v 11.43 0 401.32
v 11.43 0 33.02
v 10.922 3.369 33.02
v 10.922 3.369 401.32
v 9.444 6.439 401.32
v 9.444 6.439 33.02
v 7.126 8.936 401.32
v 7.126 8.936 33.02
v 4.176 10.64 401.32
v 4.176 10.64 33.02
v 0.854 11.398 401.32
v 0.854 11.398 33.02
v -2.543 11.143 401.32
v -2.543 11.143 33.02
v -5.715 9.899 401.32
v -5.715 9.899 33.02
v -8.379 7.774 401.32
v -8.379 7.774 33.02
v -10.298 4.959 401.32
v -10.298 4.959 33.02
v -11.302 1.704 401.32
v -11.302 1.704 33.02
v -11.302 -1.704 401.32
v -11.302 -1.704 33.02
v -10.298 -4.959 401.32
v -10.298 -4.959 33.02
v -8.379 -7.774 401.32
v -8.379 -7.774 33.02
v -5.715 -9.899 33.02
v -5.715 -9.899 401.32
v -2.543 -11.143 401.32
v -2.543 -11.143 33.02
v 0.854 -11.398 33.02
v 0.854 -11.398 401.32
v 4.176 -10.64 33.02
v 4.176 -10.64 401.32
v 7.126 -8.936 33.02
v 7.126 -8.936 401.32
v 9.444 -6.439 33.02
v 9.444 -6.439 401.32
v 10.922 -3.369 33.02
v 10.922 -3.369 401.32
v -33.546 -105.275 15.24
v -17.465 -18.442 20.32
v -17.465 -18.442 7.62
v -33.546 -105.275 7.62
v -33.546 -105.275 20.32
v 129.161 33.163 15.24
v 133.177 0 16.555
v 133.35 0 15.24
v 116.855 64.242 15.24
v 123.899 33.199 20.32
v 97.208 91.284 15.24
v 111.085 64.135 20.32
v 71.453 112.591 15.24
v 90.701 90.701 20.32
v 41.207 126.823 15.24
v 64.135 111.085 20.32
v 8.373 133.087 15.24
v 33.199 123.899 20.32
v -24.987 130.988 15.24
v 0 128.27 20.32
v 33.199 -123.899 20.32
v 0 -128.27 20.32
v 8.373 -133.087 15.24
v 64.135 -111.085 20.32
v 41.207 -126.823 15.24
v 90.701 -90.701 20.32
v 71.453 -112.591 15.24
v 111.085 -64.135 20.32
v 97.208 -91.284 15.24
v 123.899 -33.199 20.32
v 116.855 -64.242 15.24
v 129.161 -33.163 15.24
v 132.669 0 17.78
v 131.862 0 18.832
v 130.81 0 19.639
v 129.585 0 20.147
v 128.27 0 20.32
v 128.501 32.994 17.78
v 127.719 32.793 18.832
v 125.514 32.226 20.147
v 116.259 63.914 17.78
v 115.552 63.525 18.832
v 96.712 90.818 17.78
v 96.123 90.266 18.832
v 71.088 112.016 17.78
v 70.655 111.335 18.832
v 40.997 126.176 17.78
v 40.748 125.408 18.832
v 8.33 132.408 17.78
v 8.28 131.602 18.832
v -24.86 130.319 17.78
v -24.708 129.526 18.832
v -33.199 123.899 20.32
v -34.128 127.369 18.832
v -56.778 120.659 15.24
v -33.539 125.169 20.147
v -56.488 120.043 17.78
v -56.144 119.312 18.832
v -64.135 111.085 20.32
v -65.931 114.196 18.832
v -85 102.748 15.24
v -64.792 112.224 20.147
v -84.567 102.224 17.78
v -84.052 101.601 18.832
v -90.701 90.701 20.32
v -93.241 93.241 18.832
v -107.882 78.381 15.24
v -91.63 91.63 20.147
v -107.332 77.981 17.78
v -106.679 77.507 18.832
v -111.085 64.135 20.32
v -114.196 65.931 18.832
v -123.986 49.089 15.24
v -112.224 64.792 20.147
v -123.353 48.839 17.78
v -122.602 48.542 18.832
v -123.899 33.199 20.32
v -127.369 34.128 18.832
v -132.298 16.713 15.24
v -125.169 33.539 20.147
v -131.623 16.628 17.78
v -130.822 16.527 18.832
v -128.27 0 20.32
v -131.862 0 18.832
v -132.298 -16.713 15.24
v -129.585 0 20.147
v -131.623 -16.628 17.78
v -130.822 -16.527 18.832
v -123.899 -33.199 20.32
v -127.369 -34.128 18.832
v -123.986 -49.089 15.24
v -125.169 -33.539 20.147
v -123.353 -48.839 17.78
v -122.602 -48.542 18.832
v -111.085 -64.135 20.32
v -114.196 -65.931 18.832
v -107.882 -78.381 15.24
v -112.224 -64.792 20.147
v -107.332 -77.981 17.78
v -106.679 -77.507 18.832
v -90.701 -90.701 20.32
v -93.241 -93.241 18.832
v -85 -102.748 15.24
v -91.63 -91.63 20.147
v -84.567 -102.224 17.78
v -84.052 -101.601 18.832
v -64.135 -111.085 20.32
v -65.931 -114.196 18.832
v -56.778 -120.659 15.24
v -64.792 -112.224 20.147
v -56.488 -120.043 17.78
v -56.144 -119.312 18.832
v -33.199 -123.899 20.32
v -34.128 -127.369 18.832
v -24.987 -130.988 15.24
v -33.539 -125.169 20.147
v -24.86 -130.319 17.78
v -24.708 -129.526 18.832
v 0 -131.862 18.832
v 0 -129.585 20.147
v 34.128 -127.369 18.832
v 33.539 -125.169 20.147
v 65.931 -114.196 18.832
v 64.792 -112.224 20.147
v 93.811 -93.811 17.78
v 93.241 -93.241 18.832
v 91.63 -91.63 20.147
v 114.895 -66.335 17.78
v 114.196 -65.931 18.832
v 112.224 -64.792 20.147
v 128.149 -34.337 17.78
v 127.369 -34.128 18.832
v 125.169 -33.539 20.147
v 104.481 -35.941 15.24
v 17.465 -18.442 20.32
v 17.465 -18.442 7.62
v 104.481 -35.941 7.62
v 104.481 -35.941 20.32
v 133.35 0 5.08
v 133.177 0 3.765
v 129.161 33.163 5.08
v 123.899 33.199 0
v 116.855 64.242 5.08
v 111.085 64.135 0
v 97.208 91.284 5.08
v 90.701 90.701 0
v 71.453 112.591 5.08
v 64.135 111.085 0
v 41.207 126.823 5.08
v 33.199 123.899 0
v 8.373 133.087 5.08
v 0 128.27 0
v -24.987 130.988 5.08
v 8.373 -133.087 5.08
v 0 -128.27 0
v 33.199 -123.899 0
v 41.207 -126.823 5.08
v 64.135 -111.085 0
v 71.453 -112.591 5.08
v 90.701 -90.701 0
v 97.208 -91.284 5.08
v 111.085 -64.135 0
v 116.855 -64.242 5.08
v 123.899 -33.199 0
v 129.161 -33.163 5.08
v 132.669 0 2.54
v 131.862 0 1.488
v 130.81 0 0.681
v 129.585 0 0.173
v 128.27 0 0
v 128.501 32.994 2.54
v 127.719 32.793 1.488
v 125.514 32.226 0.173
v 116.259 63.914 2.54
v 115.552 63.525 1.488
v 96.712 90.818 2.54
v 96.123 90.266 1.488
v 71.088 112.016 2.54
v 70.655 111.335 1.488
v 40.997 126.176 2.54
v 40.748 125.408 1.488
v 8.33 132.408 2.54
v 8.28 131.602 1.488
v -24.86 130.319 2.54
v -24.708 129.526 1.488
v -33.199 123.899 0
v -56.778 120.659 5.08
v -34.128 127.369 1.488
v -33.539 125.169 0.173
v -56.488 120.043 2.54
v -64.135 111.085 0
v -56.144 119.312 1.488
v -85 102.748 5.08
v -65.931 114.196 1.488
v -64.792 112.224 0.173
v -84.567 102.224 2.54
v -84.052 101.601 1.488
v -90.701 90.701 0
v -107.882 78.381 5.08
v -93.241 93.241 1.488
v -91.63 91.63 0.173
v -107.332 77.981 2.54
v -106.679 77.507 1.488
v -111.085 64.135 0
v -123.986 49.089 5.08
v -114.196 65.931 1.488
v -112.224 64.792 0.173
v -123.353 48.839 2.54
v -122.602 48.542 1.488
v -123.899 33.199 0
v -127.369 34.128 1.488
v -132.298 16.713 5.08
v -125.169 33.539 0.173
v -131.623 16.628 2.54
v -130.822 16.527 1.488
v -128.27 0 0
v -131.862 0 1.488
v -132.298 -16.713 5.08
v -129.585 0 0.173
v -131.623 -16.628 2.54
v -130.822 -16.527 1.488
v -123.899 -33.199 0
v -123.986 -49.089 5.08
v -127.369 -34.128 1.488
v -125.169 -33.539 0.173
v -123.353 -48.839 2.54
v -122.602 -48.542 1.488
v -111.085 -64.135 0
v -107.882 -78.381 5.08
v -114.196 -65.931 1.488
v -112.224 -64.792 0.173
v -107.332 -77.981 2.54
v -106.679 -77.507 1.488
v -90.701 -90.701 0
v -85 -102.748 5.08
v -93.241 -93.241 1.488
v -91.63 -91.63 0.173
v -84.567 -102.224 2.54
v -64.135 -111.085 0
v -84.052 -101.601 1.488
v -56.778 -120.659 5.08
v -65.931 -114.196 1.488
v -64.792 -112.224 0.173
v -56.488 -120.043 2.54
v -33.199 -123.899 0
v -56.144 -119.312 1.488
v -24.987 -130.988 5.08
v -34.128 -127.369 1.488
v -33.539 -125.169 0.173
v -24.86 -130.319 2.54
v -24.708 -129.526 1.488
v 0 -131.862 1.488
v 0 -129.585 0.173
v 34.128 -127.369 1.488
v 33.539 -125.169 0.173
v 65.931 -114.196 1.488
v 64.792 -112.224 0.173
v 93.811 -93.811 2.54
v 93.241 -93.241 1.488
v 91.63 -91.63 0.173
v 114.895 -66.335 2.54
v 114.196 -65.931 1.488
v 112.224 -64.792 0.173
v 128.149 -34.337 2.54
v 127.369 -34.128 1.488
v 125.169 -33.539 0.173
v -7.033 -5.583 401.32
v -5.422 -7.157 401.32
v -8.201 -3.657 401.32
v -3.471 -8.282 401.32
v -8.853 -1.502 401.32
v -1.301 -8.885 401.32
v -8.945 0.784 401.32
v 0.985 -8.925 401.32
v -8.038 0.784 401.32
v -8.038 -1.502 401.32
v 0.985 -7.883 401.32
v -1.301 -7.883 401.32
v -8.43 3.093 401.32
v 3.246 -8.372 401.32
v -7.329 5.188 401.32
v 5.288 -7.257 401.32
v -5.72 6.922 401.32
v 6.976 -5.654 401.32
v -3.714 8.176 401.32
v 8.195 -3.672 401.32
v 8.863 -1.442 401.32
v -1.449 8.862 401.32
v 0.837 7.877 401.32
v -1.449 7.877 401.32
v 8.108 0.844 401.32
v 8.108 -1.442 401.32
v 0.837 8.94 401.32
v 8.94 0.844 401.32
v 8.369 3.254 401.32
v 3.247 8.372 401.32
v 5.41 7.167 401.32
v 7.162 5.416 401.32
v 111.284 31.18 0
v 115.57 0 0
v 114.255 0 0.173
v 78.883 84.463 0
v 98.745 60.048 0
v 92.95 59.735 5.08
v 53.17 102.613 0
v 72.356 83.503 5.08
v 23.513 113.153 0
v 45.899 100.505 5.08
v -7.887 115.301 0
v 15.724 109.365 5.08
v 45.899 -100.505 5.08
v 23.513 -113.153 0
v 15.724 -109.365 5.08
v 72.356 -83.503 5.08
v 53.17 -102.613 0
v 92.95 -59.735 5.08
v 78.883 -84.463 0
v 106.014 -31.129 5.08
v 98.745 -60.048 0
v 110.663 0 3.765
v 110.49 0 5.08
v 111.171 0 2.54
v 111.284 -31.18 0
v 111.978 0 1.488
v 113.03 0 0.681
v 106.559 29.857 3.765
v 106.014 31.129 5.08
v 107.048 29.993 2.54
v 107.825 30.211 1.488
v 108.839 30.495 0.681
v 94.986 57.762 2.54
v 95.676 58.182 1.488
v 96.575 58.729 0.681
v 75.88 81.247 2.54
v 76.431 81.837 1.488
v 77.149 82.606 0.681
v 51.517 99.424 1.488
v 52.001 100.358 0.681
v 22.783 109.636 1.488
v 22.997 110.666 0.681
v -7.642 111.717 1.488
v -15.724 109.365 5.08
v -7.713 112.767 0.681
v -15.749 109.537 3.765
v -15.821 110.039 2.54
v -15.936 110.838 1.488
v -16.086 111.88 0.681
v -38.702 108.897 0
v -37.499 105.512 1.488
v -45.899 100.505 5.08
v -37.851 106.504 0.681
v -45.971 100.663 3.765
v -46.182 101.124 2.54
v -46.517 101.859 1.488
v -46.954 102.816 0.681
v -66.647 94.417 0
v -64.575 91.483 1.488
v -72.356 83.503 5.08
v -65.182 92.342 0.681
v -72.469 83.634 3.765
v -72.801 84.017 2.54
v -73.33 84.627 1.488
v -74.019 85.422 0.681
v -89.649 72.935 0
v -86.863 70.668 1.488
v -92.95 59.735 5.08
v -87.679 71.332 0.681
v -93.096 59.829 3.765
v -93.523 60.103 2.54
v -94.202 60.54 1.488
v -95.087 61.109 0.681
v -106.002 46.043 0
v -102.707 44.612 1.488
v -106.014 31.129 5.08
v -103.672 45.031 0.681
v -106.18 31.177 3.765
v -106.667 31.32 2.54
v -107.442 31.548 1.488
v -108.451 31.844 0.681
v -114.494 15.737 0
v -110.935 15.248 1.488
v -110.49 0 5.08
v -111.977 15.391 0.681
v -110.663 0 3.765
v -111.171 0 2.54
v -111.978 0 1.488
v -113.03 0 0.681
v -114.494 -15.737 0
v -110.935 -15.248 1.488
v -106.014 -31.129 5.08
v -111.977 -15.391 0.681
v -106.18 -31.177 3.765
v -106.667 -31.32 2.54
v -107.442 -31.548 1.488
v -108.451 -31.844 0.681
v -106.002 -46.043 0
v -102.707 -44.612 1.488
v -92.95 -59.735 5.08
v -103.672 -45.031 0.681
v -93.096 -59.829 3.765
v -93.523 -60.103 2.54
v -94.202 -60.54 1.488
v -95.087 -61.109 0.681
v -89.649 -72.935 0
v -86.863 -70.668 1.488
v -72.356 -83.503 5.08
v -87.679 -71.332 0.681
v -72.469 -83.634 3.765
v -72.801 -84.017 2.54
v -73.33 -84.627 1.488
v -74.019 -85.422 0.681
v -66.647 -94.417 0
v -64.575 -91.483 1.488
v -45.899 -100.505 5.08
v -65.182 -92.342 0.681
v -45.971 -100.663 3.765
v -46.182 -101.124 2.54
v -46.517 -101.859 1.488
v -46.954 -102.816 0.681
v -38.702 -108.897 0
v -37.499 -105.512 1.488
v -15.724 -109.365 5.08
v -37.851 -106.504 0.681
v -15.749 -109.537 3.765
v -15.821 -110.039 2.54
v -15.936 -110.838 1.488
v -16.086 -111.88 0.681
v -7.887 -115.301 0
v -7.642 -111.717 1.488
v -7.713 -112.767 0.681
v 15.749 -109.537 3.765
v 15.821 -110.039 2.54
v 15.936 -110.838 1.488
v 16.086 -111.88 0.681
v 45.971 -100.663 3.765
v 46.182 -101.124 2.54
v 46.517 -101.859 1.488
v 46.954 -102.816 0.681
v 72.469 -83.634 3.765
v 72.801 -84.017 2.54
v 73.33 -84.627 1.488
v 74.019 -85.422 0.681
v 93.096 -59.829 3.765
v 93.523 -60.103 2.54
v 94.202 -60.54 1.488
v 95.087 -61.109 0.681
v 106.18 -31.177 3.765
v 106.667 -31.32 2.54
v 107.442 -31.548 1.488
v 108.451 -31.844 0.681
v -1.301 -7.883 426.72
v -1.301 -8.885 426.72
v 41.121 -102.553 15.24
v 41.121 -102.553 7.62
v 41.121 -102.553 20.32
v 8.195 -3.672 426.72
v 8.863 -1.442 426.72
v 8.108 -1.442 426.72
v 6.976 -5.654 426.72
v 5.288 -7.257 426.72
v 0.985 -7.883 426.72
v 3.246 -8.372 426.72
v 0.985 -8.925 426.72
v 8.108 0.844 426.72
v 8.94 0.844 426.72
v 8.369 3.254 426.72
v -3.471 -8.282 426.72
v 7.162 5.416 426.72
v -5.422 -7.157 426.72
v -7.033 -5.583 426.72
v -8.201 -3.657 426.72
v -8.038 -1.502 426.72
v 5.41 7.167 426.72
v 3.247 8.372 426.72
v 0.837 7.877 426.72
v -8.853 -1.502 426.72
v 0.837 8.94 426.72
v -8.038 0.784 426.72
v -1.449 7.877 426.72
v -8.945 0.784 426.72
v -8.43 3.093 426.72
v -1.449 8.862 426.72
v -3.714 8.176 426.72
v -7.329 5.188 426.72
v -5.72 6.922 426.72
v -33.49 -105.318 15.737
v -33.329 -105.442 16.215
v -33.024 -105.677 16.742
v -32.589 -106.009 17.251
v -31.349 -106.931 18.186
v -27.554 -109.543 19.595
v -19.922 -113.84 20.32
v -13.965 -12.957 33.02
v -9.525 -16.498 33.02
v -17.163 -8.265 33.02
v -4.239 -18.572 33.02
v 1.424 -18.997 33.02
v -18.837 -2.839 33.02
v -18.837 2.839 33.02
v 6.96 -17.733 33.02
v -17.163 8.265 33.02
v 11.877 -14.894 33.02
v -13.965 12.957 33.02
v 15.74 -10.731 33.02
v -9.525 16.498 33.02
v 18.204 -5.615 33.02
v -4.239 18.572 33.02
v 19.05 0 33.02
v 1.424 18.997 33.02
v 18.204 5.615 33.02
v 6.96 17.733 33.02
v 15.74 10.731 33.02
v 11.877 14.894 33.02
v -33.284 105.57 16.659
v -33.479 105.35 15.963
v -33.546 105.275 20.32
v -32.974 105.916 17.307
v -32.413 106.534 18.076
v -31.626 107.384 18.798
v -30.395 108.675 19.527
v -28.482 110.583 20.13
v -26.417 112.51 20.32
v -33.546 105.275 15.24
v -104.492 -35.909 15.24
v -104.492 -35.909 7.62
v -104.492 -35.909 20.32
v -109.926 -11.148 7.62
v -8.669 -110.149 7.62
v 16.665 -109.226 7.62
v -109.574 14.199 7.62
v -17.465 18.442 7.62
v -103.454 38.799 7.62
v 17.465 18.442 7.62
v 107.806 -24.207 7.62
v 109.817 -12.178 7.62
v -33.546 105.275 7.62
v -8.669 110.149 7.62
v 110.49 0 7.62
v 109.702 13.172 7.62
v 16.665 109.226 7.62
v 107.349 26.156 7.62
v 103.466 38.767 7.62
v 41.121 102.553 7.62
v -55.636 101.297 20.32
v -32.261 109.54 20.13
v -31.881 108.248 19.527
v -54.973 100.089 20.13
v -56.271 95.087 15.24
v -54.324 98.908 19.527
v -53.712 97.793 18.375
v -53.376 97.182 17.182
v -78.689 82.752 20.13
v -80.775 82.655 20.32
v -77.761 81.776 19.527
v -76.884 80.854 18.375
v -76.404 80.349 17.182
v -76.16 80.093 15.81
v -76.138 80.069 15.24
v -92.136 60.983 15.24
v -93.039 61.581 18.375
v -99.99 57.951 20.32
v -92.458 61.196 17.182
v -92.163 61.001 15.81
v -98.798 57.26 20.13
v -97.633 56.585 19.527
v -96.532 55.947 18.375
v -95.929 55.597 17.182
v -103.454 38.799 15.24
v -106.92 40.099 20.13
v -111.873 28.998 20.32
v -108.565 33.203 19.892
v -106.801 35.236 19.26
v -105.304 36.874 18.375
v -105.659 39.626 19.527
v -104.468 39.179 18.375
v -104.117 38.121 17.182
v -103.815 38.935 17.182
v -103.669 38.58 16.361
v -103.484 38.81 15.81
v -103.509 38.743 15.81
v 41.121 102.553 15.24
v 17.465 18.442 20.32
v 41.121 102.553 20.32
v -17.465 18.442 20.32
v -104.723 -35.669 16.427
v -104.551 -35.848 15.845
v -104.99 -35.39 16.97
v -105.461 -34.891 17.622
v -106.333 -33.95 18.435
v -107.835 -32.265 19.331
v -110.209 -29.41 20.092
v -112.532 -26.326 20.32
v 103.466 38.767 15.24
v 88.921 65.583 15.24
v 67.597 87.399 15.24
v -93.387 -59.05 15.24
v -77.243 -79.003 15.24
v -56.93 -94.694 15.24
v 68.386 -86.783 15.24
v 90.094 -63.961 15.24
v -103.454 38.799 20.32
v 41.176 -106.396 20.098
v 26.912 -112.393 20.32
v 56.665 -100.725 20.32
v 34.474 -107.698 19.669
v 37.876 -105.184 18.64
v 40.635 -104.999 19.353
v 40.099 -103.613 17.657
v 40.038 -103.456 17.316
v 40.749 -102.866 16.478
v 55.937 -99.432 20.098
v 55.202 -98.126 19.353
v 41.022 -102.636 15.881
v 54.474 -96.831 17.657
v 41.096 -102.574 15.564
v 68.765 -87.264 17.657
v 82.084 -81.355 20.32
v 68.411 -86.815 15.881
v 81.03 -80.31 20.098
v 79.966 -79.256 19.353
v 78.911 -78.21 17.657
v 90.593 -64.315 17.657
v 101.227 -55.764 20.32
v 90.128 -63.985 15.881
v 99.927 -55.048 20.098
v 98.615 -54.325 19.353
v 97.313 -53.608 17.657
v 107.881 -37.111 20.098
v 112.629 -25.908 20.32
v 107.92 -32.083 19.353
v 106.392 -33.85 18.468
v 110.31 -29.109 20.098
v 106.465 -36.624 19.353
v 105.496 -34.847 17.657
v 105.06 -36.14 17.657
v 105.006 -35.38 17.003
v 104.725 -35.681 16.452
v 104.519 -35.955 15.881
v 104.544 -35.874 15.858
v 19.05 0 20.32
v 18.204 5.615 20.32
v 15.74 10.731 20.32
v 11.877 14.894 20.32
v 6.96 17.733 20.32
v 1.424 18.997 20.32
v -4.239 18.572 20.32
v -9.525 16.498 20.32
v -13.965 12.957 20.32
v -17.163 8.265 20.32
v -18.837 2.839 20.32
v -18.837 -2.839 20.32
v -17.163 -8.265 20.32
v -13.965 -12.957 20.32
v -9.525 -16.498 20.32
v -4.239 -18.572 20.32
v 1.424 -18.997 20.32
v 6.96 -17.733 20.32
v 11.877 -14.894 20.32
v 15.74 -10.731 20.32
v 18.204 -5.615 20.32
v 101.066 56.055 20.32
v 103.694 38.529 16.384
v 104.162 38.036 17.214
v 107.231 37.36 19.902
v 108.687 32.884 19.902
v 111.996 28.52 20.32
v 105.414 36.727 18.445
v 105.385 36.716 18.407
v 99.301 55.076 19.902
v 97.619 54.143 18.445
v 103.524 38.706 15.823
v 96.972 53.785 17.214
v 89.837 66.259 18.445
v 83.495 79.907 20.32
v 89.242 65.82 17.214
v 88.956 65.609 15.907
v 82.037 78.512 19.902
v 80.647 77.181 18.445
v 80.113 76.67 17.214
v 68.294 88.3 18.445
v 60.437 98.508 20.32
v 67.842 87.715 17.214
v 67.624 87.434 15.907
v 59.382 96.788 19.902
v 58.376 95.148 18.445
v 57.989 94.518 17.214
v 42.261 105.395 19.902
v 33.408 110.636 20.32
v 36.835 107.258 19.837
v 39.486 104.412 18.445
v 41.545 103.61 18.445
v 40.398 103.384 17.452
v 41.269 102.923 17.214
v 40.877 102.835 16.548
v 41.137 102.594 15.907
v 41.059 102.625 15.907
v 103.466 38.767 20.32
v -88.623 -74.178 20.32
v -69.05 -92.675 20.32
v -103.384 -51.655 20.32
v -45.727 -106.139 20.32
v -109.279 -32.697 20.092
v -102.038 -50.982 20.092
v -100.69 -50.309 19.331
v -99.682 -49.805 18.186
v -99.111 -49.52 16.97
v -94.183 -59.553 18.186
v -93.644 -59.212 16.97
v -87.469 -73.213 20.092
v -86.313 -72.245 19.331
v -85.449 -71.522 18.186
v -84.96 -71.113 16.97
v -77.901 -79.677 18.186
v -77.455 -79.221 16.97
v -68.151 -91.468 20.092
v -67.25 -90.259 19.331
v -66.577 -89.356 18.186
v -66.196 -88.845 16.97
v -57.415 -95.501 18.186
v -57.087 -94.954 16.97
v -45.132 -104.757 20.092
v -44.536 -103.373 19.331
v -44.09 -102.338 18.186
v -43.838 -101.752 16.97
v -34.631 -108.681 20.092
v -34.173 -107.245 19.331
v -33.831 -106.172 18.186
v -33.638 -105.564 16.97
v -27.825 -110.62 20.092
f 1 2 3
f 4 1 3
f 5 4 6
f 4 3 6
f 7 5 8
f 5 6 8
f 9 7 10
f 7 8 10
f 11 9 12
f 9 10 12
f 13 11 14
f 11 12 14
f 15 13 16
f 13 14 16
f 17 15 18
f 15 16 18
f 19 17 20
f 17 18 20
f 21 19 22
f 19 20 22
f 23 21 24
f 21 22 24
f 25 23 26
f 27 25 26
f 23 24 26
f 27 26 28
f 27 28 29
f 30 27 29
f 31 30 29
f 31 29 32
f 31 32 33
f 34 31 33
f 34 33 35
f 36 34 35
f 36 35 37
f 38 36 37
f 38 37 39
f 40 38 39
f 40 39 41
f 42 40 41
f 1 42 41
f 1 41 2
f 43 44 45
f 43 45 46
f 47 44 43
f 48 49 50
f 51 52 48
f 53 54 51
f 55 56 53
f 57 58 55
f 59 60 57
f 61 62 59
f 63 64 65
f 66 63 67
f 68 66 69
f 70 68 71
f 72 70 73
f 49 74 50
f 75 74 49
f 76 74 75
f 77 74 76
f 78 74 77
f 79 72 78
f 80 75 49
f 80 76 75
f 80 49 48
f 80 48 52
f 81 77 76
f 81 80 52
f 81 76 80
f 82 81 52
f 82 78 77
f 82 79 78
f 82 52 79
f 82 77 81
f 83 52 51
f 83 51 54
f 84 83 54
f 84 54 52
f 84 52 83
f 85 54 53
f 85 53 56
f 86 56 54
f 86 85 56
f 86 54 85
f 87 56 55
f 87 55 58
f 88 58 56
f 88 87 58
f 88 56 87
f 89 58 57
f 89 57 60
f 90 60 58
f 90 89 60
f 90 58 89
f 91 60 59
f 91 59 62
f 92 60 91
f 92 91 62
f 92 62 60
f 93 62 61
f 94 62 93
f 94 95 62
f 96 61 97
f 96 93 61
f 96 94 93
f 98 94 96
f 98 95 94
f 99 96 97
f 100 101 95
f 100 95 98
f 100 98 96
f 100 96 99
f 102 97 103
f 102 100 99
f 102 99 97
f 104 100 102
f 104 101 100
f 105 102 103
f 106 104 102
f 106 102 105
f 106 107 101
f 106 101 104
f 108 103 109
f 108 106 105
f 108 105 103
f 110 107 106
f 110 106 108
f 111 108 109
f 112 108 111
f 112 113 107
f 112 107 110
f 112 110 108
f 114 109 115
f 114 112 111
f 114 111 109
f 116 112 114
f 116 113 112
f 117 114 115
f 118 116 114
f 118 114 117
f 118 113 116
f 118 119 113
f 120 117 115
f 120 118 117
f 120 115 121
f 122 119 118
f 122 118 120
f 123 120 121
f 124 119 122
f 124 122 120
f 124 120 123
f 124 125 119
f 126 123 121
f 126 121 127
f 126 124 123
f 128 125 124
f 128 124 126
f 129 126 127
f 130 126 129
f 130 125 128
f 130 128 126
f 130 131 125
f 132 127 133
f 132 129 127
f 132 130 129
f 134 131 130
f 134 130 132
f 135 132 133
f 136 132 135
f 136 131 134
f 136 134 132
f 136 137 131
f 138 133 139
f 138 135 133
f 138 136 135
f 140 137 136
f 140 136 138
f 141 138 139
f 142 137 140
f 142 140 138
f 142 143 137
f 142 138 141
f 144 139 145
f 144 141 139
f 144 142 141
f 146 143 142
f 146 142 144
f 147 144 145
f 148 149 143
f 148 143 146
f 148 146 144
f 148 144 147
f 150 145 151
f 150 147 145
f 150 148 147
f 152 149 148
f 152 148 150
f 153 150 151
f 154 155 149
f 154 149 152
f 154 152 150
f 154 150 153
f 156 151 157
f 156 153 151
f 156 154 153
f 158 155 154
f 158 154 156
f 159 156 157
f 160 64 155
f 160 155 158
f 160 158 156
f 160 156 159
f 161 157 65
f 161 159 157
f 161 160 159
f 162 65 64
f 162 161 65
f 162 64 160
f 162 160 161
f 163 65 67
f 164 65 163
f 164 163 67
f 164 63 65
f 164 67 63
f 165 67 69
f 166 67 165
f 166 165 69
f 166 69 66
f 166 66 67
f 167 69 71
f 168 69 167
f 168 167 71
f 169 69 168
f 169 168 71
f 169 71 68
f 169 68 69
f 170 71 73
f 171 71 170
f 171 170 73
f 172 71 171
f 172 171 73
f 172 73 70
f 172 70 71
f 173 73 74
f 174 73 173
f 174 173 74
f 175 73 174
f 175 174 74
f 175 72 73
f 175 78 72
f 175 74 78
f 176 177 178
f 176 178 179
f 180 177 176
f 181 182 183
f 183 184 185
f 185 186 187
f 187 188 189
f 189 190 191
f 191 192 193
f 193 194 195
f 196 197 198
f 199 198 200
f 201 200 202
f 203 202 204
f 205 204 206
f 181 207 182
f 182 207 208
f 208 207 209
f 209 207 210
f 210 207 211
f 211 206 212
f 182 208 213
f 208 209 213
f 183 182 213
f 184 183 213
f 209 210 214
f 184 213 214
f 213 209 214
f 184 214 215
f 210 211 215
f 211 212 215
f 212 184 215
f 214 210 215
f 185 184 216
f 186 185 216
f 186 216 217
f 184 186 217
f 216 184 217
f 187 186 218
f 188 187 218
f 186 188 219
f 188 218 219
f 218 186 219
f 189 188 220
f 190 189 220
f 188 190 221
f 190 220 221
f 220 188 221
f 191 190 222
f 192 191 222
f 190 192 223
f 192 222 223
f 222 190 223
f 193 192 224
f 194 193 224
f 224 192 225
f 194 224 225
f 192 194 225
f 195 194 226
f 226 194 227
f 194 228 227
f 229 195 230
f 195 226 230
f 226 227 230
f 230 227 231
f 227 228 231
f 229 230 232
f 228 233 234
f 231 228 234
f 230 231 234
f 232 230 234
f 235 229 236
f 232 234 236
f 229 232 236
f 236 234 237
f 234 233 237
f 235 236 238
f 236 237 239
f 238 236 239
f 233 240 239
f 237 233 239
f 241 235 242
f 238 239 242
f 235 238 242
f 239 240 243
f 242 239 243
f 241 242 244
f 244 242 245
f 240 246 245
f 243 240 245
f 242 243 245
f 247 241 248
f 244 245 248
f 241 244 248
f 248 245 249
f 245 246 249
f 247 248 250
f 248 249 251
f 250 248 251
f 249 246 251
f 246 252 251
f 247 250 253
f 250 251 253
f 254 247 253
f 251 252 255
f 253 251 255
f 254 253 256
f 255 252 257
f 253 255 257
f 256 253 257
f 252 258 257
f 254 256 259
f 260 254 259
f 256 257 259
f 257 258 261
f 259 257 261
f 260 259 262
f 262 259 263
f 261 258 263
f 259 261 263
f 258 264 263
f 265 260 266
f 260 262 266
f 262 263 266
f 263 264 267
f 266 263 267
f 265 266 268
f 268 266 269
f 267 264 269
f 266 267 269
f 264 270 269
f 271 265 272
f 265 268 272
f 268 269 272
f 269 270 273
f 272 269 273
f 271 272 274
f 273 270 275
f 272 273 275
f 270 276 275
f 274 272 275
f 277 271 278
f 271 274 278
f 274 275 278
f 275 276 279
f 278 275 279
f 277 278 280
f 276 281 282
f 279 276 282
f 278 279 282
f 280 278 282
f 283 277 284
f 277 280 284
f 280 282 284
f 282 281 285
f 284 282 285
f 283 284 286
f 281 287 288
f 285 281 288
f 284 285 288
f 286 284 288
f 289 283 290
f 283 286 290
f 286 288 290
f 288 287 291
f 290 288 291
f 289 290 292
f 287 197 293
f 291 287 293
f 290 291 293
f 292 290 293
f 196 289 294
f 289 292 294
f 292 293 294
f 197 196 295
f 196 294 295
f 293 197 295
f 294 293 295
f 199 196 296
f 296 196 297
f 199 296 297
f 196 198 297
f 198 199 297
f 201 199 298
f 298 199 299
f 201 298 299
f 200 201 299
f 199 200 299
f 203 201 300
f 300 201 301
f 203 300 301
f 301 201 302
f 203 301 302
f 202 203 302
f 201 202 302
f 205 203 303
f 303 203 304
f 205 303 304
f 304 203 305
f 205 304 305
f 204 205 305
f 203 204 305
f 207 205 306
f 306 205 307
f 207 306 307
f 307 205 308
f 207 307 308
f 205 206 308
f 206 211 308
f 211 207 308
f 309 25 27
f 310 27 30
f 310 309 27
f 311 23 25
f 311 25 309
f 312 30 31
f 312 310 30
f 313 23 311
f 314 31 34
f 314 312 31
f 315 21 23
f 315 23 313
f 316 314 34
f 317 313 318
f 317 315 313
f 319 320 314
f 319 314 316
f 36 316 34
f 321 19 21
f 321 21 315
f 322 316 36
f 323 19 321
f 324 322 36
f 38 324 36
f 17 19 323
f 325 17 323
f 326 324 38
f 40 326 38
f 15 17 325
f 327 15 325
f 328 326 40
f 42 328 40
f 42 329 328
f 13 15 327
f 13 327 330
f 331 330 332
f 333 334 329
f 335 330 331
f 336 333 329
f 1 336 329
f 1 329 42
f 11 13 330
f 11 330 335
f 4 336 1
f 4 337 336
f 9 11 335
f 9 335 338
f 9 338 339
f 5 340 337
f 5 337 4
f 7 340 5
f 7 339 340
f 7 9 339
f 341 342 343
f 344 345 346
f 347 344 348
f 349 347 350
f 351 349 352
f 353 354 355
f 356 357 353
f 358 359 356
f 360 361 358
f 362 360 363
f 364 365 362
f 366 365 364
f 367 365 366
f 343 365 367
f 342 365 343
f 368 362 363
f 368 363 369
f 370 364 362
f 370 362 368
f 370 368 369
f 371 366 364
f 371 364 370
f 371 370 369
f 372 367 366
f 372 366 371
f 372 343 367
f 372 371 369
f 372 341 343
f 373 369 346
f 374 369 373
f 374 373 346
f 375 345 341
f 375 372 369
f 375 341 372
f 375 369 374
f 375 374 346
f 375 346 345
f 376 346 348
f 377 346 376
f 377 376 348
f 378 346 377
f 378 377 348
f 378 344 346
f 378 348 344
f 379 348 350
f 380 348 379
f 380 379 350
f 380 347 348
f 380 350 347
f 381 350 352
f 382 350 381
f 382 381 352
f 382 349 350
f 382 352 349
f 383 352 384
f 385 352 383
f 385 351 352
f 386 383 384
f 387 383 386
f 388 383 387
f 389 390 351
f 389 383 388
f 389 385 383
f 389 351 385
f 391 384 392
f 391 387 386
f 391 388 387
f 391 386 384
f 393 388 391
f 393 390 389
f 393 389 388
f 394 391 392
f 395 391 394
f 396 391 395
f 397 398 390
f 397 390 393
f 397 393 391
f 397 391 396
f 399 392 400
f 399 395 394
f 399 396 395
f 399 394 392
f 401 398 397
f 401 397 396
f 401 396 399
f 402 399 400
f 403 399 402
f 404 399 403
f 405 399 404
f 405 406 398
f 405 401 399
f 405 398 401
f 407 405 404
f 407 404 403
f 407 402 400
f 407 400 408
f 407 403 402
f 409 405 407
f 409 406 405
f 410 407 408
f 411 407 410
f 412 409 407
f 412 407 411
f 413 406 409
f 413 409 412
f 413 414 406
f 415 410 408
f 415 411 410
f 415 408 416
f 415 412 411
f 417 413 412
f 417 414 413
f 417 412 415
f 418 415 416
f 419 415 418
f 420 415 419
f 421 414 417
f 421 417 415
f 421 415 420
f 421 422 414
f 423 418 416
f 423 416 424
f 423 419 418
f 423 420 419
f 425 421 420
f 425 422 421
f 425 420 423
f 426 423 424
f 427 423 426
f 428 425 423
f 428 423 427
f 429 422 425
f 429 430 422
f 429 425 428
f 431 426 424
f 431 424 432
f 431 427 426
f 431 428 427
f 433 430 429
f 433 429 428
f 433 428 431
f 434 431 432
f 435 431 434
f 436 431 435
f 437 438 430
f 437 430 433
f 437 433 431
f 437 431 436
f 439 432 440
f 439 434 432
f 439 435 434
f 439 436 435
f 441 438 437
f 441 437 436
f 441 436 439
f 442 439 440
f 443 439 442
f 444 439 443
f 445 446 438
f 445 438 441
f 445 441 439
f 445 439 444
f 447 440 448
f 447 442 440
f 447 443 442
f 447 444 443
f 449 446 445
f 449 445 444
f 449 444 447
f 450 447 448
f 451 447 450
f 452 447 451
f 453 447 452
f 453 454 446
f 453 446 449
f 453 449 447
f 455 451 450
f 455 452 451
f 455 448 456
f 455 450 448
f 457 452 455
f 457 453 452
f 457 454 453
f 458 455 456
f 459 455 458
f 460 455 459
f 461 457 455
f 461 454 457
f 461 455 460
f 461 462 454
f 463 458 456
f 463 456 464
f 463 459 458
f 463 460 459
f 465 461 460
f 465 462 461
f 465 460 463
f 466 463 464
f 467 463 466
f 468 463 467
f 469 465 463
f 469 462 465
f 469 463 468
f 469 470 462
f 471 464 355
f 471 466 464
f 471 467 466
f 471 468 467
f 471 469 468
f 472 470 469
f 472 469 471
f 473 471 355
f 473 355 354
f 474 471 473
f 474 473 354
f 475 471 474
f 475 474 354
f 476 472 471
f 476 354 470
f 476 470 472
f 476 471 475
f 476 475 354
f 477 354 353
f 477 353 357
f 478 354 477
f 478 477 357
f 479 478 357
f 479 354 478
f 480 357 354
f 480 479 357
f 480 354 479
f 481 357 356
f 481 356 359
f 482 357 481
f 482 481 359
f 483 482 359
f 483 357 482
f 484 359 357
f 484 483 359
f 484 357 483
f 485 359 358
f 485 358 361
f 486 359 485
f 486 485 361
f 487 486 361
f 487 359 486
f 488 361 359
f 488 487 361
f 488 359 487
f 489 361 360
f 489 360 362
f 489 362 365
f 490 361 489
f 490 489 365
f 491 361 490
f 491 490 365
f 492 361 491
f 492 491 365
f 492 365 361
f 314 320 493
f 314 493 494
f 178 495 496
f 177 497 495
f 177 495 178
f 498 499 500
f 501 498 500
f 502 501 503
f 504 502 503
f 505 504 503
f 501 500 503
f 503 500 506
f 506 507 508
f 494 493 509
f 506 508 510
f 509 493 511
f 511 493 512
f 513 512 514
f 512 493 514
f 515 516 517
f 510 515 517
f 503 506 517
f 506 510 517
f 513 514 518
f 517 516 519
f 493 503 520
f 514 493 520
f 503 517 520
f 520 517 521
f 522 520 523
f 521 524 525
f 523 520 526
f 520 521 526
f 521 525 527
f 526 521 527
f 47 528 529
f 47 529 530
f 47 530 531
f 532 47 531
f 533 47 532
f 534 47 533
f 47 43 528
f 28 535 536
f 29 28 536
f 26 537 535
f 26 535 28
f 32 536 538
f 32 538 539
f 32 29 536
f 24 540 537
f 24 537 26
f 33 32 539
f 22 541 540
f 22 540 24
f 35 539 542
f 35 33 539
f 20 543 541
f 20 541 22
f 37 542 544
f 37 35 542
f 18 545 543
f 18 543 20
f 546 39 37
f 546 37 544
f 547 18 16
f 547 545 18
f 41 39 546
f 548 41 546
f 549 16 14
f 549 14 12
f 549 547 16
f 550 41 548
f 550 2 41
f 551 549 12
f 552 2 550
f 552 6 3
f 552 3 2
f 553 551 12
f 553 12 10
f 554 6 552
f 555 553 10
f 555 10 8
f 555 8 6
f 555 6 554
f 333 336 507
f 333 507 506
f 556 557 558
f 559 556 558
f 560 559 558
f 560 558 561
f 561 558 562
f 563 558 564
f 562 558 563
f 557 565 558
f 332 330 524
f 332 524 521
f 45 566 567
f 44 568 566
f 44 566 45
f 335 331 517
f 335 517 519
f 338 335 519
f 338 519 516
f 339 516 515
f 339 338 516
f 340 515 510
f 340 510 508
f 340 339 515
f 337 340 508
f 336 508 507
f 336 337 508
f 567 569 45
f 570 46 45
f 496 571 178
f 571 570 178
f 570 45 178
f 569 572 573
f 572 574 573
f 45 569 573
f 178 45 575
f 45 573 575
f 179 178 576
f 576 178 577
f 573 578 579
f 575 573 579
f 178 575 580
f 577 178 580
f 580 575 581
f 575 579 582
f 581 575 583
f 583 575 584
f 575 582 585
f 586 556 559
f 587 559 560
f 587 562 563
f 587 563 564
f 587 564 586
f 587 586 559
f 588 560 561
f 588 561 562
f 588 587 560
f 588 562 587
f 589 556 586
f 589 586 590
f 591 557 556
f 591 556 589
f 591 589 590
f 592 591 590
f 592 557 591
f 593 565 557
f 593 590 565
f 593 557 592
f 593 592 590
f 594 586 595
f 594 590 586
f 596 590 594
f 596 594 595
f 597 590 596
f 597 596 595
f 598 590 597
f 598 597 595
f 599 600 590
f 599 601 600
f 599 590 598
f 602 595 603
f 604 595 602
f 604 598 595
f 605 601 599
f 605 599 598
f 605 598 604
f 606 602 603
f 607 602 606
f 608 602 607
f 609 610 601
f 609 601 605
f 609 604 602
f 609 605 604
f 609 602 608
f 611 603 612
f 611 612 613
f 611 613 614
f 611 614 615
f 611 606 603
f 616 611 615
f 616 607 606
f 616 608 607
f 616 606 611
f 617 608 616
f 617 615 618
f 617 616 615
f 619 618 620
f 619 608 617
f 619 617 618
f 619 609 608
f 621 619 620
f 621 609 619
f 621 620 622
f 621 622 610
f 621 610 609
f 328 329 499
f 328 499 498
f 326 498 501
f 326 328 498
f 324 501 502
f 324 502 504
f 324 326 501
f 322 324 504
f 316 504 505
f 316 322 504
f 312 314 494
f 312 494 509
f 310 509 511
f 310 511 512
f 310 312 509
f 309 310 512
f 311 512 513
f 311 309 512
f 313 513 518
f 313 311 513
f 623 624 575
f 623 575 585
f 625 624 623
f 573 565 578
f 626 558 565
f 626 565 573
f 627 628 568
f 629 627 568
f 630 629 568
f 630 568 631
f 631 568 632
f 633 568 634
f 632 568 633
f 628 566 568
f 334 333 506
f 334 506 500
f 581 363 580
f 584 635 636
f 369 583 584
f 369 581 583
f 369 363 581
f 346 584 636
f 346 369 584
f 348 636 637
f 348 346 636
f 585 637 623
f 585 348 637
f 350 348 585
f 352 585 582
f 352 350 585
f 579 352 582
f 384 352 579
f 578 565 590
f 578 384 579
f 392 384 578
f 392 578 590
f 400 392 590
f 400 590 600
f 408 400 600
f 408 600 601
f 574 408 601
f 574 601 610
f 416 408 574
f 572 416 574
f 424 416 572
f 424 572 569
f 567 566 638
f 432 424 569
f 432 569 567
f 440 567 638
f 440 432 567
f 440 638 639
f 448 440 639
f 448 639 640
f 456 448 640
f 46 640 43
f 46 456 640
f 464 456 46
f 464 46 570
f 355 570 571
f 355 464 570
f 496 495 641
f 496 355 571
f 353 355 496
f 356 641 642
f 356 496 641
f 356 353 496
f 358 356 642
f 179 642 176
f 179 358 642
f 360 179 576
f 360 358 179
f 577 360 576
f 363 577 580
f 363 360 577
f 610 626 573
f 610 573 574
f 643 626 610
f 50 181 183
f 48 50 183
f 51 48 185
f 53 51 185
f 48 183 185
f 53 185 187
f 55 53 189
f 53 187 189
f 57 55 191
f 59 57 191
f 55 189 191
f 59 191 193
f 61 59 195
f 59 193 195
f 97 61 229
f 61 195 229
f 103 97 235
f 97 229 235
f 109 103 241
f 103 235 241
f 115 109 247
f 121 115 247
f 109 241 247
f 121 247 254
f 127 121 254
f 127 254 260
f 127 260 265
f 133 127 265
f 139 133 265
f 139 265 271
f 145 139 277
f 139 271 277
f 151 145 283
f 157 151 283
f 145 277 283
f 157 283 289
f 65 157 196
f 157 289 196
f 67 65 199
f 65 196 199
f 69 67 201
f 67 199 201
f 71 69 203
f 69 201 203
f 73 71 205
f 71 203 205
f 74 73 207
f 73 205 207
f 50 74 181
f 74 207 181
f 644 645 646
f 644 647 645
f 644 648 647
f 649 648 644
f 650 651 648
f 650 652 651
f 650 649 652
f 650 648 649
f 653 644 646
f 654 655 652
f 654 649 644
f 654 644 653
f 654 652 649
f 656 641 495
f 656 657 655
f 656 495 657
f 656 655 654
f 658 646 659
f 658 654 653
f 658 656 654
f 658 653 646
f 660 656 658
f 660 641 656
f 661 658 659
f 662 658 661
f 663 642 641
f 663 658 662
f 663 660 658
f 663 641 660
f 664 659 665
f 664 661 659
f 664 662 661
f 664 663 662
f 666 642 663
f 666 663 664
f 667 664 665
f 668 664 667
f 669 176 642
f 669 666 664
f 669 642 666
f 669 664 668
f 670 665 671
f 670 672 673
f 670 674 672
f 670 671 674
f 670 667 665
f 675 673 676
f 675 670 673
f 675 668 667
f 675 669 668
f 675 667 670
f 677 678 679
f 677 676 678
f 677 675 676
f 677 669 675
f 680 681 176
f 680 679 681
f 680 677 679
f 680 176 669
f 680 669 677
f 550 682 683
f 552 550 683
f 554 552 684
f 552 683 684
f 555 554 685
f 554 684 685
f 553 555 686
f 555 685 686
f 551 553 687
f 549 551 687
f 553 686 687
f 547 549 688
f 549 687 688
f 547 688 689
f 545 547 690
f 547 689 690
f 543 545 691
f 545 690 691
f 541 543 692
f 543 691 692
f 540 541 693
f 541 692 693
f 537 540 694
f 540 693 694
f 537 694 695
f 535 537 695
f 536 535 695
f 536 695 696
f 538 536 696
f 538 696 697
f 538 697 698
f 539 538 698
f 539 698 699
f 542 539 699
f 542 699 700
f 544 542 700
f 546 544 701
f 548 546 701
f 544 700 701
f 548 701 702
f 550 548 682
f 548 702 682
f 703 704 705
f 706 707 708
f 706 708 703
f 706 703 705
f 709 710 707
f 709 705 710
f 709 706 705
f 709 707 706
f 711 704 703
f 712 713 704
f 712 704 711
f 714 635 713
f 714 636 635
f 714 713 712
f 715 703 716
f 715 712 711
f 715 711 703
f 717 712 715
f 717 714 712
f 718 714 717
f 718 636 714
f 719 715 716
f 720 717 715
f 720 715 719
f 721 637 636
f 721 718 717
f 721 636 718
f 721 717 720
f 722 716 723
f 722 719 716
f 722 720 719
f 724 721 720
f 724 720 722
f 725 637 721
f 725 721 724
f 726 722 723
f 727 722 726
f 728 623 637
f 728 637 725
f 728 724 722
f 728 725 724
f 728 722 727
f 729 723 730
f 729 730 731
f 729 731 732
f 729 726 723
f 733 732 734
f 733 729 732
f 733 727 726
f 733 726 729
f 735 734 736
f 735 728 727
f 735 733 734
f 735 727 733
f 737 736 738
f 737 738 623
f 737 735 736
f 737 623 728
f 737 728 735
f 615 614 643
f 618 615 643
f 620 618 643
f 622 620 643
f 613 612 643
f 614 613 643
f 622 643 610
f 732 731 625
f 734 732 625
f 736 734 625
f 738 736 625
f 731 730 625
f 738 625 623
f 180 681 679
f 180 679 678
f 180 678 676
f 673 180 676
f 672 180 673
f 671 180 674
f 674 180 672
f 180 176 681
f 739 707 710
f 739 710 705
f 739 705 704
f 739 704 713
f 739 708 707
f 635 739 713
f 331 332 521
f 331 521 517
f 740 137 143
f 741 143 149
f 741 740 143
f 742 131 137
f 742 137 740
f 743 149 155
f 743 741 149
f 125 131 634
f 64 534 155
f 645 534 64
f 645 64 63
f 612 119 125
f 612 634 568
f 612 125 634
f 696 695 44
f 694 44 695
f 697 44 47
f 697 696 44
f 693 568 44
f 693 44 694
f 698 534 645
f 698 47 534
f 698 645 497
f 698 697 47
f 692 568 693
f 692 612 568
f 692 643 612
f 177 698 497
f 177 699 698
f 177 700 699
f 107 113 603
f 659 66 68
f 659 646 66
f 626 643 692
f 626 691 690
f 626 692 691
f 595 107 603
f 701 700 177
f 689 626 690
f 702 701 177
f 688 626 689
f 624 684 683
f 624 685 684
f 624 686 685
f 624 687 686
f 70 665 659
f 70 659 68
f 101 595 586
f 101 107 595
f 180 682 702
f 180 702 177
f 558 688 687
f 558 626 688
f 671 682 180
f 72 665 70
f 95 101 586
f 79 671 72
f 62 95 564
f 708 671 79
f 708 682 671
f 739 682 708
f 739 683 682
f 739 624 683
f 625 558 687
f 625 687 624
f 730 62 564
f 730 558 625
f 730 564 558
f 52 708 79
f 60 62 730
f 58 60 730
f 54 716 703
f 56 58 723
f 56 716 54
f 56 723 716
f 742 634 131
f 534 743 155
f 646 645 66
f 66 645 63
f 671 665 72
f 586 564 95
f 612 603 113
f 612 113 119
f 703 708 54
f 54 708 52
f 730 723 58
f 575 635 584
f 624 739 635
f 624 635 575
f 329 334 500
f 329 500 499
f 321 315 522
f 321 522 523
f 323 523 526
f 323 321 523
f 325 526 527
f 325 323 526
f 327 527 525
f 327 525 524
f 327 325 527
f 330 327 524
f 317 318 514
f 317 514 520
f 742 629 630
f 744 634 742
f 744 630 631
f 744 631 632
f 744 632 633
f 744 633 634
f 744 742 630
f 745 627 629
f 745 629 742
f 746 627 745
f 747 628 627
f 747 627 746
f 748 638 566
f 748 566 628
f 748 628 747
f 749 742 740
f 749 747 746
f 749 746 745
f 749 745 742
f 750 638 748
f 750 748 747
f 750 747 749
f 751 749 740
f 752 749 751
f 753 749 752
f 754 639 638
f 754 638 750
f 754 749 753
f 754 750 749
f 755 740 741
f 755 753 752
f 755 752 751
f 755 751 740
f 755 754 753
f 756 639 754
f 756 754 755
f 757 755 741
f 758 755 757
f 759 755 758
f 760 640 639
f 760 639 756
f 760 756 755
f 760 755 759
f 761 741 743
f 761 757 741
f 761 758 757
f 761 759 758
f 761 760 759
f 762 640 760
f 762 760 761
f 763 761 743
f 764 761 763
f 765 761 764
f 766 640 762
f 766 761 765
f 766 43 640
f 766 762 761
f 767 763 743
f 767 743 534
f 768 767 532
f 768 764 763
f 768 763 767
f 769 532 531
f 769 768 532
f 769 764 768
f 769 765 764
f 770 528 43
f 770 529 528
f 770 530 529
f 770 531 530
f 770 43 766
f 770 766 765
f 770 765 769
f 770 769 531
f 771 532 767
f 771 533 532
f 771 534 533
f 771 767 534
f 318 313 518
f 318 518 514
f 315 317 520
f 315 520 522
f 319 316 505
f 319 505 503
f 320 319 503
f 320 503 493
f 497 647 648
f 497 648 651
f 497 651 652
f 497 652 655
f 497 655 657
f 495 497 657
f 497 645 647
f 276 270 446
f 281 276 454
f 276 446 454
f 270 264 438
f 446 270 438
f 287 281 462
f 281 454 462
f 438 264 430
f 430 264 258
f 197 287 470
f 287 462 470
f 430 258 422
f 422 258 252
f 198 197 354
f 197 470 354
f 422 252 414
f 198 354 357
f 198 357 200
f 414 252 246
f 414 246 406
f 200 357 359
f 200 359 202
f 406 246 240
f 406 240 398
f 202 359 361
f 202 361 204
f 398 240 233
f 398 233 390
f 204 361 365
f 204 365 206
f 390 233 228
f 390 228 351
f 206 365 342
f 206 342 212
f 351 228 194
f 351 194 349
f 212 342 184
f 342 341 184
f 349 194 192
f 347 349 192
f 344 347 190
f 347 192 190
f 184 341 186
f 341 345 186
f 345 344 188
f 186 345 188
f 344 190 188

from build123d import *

# Parameters (mm, degrees)
SKETCH1_R           = 133.35
SKETCH1_R_2         = 110.49
BOSS_EXTRUDE1_DEPTH = 20.32
FILLET1_R           = 5.08
FILLET4_R           = 5.08
FILLET5_R           = 5.08
FILLET6_R           = 5.08
SKETCH2_R           = 25.4
BOSS_EXTRUDE2_DEPTH = 12.7
SKETCH3_R           = 11.43
BOSS_EXTRUDE3_DEPTH = 381
BOSS_EXTRUDE4_DEPTH = 25.4
SKETCH5_R           = 19.05
BOSS_EXTRUDE5_DEPTH = 12.7


with BuildPart() as part:
    # Sketch1 → Boss-Extrude1 (new body)
    with BuildSketch(Plane.XY):
        Circle(SKETCH1_R)
        Circle(SKETCH1_R_2, mode=Mode.SUBTRACT)
    extrude(amount=BOSS_EXTRUDE1_DEPTH)

    # Fillet1
    fillet1_edges = [part.edges().sort_by_distance(p)[0] for p in [
        (-133.35, 0, 20.32),
    ]]
    fillet(fillet1_edges, radius=FILLET1_R)

    # Fillet4
    fillet4_edges = [part.edges().sort_by_distance(p)[0] for p in [
        (-133.35, 0, 0),
    ]]
    fillet(fillet4_edges, radius=FILLET4_R)

    # Fillet5
    fillet5_edges = [part.edges().sort_by_distance(p)[0] for p in [
        (-110.49, 0, 20.32),
    ]]
    fillet(fillet5_edges, radius=FILLET5_R)

    # Fillet6
    fillet6_edges = [part.edges().sort_by_distance(p)[0] for p in [
        (-110.49, 0, 0),
    ]]
    fillet(fillet6_edges, radius=FILLET6_R)



with BuildPart() as body_2:
    # Sketch2 → Boss-Extrude2 (new body)
    with BuildSketch(Plane.XY.offset(20.32)):
        with BuildLine():
            add(Edge.make_bspline(
                [(111.995773379, 28.519671196), (108.395461325, 33.640925655), (103.465758881, 38.766955506)],
                knots=[0.86323948, 0.86323948, 0.86323948, 1, 1, 1], degree=2))
            Line((103.465758881, 38.766955506), (17.465361403, 18.442373791))
            ThreePointArc((17.465361403, 18.442373791), (23.332168562, 10.038421698), (25.4, 0))
            ThreePointArc((25.4, 0), (23.332168562, -10.038421698), (17.465361403, -18.442373791))
            Line((17.465361403, -18.442373791), (104.480917214, -35.941313806))
            add(Edge.make_bspline(
                [(104.480917214, -35.941313806), (109.199570697, -30.926942984), (112.628608991, -25.907939648)],
                knots=[0, 0, 0, 0.134699054, 0.134699054, 0.134699054], degree=2))
            ThreePointArc((112.628608991, -25.907939648), (114.832297811, -13.037188327), (115.57, 0))
            ThreePointArc((115.57, 0), (114.672962004, 14.37138425), (111.995773379, 28.519671196))
        make_face()
        with BuildLine():
            ThreePointArc((-17.465361403, 18.442373791), (0, 25.4), (17.465361403, 18.442373791))
            Line((17.465361403, 18.442373791), (41.120888712, 102.55297466))
            add(Edge.make_bspline(
                [(33.408134269, 110.6359863), (37.257292789, 107.035833442), (41.120888712, 102.55297466)],
                knots=[0.898413925, 0.898413925, 0.898413925, 1, 1, 1], degree=2))
            ThreePointArc((33.408134269, 110.6359863), (3.618968694, 115.513323758), (-26.417084957, 112.510277408))
            add(Edge.make_bspline(
                [(-33.5455644, 105.274570572), (-29.987921782, 109.295772293), (-26.417084957, 112.510277408)],
                knots=[0, 0, 0, 0.097113874, 0.097113874, 0.097113874], degree=2))
            Line((-33.5455644, 105.274570572), (-17.465361403, 18.442373791))
        make_face()
        with BuildLine():
            Line((41.120888883, -102.552974591), (17.465361403, -18.442373791))
            ThreePointArc((17.465361403, -18.442373791), (0, -25.4), (-17.465361403, -18.442373791))
            Line((-17.465361403, -18.442373791), (-33.545564575, -105.274570516))
            add(Edge.make_bspline(
                [(-33.545564575, -105.274570516), (-26.738144431, -110.571915765), (-19.922448027, -113.839891798)],
                knots=[0, 0, 0, 0.182948004, 0.182948004, 0.182948004], degree=2))
            ThreePointArc((-19.922448027, -113.839891798), (3.568860133, -115.514882753), (26.911965601, -112.392931306))
            add(Edge.make_bspline(
                [(26.911965601, -112.392931306), (34.011973832, -108.564945177), (41.120888883, -102.552974591)],
                knots=[0.810210618, 0.810210618, 0.810210618, 1, 1, 1], degree=2))
        make_face()
        with BuildLine():
            ThreePointArc((-17.465361403, -18.442373791), (-25.4, 0), (-17.465361403, 18.442373791))
            Line((-17.465361403, 18.442373791), (-103.453712161, 38.799092001))
            add(Edge.make_bspline(
                [(-111.872978372, 28.997613871), (-108.286344087, 33.895850119), (-103.453712161, 38.799092001)],
                knots=[0.869248391, 0.869248391, 0.869248391, 1, 1, 1], degree=2))
            ThreePointArc((-111.872978372, 28.997613871), (-115.56181287, 1.375611191), (-112.531537583, -26.326373643))
            add(Edge.make_bspline(
                [(-104.492035357, -35.908977246), (-109.115451856, -31.120100592), (-112.531537583, -26.326373643)],
                knots=[0, 0, 0, 0.128706822, 0.128706822, 0.128706822], degree=2))
            Line((-104.492035357, -35.908977246), (-17.465361403, -18.442373791))
        make_face()
        Circle(SKETCH2_R)
    extrude(amount=-BOSS_EXTRUDE2_DEPTH)


with BuildPart() as part_1:
    add(part.part)

    add(body_2.part)  # Boss-Extrude3 merges body 2
    # Sketch3 → Boss-Extrude3 (add)
    with BuildSketch(Plane.XY.offset(20.32)):
        Circle(SKETCH3_R)
    extrude(amount=BOSS_EXTRUDE3_DEPTH)

    # Sketch4 → Boss-Extrude4 (add)
    with BuildSketch(Plane.XY.offset(401.32)):
        with BuildLine():
            Line((0.984973427, -8.925344441), (0.984973427, -7.883058907))
            Line((0.984973427, -7.883058907), (-1.301026573, -7.883058907))
            Line((-1.301026573, -7.883058907), (-1.301026573, -8.884777763))
            ThreePointArc((-1.301026573, -8.884777763), (-6.277222362, -6.420936494), (-8.853056418, -1.501778309))
            Line((-8.853056418, -1.501778309), (-8.038471669, -1.501778309))
            Line((-8.038471669, -1.501778309), (-8.038471669, 0.784221691))
            Line((-8.038471669, 0.784221691), (-8.945218968, 0.784221691))
            ThreePointArc((-8.945218968, 0.784221691), (-6.582089434, 6.108031166), (-1.449428448, 8.861777655))
            Line((-1.449428448, 8.861777655), (-1.449428448, 7.87722015))
            Line((-1.449428448, 7.87722015), (0.836571552, 7.87722015))
            Line((0.836571552, 7.87722015), (0.836571552, 8.940475048))
            ThreePointArc((0.836571552, 8.940475048), (6.346995913, 6.351975198), (8.939816257, 0.84358244))
            Line((8.939816257, 0.84358244), (8.107652261, 0.84358244))
            Line((8.107652261, 0.84358244), (8.107652261, -1.44241756))
            Line((8.107652261, -1.44241756), (8.862921506, -1.44241756))
            ThreePointArc((8.862921506, -1.44241756), (6.18415777, -6.510617383), (0.984973427, -8.925344441))
        make_face()
    extrude(amount=BOSS_EXTRUDE4_DEPTH)

    # Sketch5 → Boss-Extrude5 (add)
    with BuildSketch(Plane.XY.offset(20.32)):
        Circle(SKETCH5_R)
    extrude(amount=BOSS_EXTRUDE5_DEPTH)


solid = part_1.part
